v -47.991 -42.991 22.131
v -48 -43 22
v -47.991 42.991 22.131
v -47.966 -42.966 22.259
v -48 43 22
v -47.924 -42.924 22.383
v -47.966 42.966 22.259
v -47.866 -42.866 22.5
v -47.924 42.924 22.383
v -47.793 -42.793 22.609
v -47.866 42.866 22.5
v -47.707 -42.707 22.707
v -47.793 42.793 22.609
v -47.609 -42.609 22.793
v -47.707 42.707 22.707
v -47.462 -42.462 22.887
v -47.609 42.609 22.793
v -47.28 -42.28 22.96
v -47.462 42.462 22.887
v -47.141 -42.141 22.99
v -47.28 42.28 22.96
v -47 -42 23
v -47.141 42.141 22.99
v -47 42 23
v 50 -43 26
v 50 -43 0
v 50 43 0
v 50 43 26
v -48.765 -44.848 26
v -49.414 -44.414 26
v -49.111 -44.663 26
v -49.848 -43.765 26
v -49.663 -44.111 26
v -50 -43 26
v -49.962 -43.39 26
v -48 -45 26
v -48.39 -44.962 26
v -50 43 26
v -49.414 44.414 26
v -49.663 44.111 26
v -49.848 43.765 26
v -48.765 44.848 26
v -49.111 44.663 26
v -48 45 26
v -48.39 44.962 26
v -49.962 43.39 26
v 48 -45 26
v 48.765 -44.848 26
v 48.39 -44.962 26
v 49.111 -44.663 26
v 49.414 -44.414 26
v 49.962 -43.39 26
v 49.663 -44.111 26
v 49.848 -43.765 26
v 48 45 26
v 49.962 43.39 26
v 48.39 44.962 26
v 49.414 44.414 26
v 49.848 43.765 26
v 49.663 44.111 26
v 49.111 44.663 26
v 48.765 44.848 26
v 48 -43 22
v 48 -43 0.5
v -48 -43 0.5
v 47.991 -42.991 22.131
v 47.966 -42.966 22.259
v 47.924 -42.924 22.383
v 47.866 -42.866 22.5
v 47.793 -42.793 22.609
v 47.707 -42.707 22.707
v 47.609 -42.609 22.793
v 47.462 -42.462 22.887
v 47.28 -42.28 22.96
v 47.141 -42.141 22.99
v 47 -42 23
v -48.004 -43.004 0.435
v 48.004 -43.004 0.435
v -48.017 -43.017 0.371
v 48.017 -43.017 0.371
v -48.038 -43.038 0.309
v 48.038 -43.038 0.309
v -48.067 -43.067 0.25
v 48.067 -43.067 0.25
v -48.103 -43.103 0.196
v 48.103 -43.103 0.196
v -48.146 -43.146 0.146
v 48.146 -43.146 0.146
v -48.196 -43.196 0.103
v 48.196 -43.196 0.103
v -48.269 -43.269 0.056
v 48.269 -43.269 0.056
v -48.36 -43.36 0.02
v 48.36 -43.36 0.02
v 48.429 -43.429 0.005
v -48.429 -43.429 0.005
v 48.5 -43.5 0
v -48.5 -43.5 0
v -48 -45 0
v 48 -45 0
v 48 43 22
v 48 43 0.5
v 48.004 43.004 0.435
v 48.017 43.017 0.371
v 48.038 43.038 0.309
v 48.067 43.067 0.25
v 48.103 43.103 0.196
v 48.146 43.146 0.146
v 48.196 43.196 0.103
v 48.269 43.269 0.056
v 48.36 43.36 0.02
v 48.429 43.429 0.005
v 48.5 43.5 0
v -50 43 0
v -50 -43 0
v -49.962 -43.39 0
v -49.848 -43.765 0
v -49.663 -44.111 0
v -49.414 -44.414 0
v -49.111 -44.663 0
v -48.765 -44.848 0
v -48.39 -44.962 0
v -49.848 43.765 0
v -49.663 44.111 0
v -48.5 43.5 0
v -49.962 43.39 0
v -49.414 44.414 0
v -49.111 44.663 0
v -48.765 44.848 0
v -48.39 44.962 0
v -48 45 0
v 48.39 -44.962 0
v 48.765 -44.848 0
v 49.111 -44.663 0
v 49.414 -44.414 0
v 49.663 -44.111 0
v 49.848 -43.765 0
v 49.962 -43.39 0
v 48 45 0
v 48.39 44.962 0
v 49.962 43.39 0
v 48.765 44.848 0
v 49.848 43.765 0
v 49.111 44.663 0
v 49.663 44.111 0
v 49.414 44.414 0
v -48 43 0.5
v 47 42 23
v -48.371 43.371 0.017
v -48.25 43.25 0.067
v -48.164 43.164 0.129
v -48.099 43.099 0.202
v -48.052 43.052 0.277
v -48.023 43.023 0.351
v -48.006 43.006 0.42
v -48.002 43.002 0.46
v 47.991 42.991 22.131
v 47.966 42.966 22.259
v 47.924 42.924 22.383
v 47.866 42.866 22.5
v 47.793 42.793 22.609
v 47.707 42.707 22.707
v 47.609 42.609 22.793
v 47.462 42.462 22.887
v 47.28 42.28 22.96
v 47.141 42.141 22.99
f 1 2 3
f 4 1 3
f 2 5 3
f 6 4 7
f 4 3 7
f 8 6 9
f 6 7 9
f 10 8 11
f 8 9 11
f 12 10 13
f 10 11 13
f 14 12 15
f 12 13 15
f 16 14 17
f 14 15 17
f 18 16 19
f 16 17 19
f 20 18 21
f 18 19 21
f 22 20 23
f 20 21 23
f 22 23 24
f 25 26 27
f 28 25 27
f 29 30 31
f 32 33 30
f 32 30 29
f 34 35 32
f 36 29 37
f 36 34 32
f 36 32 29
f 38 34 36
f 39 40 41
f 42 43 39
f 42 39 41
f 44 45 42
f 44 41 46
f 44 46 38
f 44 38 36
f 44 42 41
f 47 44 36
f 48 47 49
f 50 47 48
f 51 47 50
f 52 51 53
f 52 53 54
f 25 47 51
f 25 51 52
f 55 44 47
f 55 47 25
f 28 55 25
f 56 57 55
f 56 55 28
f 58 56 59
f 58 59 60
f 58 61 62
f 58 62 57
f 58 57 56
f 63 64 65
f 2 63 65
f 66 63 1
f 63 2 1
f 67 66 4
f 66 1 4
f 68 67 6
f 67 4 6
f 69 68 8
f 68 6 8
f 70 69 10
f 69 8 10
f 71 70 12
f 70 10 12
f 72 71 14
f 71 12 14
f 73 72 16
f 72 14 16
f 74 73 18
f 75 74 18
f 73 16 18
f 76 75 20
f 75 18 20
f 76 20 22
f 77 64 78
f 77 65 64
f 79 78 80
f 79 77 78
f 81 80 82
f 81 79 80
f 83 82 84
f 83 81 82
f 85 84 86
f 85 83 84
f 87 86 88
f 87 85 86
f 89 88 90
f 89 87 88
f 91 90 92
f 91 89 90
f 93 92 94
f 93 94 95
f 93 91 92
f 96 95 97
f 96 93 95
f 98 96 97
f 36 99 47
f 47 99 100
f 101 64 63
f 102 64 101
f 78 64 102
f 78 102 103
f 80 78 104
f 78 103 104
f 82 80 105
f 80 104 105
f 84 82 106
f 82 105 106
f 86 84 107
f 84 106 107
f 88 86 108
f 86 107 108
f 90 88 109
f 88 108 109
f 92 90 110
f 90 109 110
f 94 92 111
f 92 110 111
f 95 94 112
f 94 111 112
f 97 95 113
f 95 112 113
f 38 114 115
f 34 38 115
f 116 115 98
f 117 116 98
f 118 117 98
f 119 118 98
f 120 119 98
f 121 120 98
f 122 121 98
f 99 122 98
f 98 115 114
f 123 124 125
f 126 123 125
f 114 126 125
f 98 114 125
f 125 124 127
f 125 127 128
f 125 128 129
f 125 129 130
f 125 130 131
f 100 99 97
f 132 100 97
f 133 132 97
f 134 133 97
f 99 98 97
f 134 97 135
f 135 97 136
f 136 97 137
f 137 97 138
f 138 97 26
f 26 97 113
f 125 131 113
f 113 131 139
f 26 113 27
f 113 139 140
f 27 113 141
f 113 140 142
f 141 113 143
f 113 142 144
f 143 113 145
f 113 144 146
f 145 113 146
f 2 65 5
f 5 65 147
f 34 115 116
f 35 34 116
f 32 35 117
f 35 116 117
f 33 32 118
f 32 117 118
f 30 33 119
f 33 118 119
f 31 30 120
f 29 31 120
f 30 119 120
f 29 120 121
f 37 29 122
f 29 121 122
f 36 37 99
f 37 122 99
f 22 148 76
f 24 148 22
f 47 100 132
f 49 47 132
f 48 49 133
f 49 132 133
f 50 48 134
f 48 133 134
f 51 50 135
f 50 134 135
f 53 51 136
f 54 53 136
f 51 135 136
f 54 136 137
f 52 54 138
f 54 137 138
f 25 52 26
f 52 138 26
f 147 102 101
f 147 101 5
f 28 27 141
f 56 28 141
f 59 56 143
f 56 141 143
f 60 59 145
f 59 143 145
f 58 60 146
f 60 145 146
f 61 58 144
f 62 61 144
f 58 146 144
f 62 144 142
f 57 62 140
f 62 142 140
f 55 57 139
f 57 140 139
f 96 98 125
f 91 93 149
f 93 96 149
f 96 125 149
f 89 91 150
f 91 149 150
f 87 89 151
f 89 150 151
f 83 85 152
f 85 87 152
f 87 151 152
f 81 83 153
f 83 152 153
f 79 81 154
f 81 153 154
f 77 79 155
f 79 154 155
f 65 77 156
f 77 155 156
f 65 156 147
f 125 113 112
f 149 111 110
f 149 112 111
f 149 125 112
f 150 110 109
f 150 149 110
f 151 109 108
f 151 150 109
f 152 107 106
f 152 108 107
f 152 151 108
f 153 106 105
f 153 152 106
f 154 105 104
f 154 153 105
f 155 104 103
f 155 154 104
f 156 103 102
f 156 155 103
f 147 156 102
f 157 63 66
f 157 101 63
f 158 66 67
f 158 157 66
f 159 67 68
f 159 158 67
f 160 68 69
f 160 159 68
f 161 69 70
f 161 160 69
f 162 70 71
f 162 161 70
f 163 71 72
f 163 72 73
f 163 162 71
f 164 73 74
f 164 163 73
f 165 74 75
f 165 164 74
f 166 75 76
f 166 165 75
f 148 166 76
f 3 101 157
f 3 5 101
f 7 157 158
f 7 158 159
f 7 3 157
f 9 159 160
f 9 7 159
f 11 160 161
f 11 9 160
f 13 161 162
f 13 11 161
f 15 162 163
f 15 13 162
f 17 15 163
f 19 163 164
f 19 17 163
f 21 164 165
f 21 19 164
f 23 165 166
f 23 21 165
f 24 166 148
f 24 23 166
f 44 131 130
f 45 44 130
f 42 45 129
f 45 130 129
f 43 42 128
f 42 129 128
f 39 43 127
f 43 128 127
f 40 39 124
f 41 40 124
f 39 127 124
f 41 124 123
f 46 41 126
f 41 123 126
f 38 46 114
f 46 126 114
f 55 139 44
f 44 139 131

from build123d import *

# Parameters (mm, degrees)
EXTRUDE_1_DEPTH     = 26
SKETCH_2_W          = 95
SKETCH_2_H          = 85
CUT_EXTRUDE_1_DEPTH = 23
SKETCH_3_W          = 96
SKETCH_3_H          = 86
CUT_EXTRUDE_2_DEPTH = 23
FILLET_1_R          = 1
FILLET_2_R          = 0.5


with BuildPart() as part:
    # Эскиз1 → Бобышка-Вытянуть1 (new body)
    with BuildSketch(Plane.XY):
        with BuildLine():
            Line((-48, -45), (48, -45))
            ThreePointArc((48, -45), (49.414213562, -44.414213562), (50, -43))
            Line((50, -43), (50, 43))
            ThreePointArc((50, 43), (49.414213562, 44.414213562), (48, 45))
            Line((48, 45), (-48, 45))
            ThreePointArc((-48, 45), (-49.414213562, 44.414213562), (-50, 43))
            Line((-50, 43), (-50, -43))
            ThreePointArc((-50, -43), (-49.414213562, -44.414213562), (-48, -45))
        make_face()
    extrude(amount=EXTRUDE_1_DEPTH)

    # Эскиз2 → Вырез-Вытянуть1 (cut)
    with BuildSketch(Plane(origin=(0, 0, 0), x_dir=(-1, 0, 0), z_dir=(0, 0, -1))):
        Rectangle(SKETCH_2_W, SKETCH_2_H)
    extrude(amount=-CUT_EXTRUDE_1_DEPTH, mode=Mode.SUBTRACT)

    # Эскиз3 → Вырез-Вытянуть2 (cut)
    with BuildSketch(Plane(origin=(0, 0, 0), x_dir=(-1, 0, 0), z_dir=(0, 0, -1))):
        Rectangle(SKETCH_3_W, SKETCH_3_H)
    extrude(amount=-CUT_EXTRUDE_2_DEPTH, mode=Mode.SUBTRACT)

    # Скругление1
    fillet_1_edges = [part.edges().sort_by_distance(p)[0] for p in [
        (48, 0, 23),
        (0, 43, 23),
        (-48, 0, 23),
        (0, -43, 23),
    ]]
    fillet(fillet_1_edges, radius=FILLET_1_R)

    # Скругление2
    fillet_2_edges = [part.edges().sort_by_distance(p)[0] for p in [
        (48, 0, 0),
        (0, -43, 0),
        (-48, 0, 0),
        (0, 43, 0),
    ]]
    fillet(fillet_2_edges, radius=FILLET_2_R)


solid = part.part
